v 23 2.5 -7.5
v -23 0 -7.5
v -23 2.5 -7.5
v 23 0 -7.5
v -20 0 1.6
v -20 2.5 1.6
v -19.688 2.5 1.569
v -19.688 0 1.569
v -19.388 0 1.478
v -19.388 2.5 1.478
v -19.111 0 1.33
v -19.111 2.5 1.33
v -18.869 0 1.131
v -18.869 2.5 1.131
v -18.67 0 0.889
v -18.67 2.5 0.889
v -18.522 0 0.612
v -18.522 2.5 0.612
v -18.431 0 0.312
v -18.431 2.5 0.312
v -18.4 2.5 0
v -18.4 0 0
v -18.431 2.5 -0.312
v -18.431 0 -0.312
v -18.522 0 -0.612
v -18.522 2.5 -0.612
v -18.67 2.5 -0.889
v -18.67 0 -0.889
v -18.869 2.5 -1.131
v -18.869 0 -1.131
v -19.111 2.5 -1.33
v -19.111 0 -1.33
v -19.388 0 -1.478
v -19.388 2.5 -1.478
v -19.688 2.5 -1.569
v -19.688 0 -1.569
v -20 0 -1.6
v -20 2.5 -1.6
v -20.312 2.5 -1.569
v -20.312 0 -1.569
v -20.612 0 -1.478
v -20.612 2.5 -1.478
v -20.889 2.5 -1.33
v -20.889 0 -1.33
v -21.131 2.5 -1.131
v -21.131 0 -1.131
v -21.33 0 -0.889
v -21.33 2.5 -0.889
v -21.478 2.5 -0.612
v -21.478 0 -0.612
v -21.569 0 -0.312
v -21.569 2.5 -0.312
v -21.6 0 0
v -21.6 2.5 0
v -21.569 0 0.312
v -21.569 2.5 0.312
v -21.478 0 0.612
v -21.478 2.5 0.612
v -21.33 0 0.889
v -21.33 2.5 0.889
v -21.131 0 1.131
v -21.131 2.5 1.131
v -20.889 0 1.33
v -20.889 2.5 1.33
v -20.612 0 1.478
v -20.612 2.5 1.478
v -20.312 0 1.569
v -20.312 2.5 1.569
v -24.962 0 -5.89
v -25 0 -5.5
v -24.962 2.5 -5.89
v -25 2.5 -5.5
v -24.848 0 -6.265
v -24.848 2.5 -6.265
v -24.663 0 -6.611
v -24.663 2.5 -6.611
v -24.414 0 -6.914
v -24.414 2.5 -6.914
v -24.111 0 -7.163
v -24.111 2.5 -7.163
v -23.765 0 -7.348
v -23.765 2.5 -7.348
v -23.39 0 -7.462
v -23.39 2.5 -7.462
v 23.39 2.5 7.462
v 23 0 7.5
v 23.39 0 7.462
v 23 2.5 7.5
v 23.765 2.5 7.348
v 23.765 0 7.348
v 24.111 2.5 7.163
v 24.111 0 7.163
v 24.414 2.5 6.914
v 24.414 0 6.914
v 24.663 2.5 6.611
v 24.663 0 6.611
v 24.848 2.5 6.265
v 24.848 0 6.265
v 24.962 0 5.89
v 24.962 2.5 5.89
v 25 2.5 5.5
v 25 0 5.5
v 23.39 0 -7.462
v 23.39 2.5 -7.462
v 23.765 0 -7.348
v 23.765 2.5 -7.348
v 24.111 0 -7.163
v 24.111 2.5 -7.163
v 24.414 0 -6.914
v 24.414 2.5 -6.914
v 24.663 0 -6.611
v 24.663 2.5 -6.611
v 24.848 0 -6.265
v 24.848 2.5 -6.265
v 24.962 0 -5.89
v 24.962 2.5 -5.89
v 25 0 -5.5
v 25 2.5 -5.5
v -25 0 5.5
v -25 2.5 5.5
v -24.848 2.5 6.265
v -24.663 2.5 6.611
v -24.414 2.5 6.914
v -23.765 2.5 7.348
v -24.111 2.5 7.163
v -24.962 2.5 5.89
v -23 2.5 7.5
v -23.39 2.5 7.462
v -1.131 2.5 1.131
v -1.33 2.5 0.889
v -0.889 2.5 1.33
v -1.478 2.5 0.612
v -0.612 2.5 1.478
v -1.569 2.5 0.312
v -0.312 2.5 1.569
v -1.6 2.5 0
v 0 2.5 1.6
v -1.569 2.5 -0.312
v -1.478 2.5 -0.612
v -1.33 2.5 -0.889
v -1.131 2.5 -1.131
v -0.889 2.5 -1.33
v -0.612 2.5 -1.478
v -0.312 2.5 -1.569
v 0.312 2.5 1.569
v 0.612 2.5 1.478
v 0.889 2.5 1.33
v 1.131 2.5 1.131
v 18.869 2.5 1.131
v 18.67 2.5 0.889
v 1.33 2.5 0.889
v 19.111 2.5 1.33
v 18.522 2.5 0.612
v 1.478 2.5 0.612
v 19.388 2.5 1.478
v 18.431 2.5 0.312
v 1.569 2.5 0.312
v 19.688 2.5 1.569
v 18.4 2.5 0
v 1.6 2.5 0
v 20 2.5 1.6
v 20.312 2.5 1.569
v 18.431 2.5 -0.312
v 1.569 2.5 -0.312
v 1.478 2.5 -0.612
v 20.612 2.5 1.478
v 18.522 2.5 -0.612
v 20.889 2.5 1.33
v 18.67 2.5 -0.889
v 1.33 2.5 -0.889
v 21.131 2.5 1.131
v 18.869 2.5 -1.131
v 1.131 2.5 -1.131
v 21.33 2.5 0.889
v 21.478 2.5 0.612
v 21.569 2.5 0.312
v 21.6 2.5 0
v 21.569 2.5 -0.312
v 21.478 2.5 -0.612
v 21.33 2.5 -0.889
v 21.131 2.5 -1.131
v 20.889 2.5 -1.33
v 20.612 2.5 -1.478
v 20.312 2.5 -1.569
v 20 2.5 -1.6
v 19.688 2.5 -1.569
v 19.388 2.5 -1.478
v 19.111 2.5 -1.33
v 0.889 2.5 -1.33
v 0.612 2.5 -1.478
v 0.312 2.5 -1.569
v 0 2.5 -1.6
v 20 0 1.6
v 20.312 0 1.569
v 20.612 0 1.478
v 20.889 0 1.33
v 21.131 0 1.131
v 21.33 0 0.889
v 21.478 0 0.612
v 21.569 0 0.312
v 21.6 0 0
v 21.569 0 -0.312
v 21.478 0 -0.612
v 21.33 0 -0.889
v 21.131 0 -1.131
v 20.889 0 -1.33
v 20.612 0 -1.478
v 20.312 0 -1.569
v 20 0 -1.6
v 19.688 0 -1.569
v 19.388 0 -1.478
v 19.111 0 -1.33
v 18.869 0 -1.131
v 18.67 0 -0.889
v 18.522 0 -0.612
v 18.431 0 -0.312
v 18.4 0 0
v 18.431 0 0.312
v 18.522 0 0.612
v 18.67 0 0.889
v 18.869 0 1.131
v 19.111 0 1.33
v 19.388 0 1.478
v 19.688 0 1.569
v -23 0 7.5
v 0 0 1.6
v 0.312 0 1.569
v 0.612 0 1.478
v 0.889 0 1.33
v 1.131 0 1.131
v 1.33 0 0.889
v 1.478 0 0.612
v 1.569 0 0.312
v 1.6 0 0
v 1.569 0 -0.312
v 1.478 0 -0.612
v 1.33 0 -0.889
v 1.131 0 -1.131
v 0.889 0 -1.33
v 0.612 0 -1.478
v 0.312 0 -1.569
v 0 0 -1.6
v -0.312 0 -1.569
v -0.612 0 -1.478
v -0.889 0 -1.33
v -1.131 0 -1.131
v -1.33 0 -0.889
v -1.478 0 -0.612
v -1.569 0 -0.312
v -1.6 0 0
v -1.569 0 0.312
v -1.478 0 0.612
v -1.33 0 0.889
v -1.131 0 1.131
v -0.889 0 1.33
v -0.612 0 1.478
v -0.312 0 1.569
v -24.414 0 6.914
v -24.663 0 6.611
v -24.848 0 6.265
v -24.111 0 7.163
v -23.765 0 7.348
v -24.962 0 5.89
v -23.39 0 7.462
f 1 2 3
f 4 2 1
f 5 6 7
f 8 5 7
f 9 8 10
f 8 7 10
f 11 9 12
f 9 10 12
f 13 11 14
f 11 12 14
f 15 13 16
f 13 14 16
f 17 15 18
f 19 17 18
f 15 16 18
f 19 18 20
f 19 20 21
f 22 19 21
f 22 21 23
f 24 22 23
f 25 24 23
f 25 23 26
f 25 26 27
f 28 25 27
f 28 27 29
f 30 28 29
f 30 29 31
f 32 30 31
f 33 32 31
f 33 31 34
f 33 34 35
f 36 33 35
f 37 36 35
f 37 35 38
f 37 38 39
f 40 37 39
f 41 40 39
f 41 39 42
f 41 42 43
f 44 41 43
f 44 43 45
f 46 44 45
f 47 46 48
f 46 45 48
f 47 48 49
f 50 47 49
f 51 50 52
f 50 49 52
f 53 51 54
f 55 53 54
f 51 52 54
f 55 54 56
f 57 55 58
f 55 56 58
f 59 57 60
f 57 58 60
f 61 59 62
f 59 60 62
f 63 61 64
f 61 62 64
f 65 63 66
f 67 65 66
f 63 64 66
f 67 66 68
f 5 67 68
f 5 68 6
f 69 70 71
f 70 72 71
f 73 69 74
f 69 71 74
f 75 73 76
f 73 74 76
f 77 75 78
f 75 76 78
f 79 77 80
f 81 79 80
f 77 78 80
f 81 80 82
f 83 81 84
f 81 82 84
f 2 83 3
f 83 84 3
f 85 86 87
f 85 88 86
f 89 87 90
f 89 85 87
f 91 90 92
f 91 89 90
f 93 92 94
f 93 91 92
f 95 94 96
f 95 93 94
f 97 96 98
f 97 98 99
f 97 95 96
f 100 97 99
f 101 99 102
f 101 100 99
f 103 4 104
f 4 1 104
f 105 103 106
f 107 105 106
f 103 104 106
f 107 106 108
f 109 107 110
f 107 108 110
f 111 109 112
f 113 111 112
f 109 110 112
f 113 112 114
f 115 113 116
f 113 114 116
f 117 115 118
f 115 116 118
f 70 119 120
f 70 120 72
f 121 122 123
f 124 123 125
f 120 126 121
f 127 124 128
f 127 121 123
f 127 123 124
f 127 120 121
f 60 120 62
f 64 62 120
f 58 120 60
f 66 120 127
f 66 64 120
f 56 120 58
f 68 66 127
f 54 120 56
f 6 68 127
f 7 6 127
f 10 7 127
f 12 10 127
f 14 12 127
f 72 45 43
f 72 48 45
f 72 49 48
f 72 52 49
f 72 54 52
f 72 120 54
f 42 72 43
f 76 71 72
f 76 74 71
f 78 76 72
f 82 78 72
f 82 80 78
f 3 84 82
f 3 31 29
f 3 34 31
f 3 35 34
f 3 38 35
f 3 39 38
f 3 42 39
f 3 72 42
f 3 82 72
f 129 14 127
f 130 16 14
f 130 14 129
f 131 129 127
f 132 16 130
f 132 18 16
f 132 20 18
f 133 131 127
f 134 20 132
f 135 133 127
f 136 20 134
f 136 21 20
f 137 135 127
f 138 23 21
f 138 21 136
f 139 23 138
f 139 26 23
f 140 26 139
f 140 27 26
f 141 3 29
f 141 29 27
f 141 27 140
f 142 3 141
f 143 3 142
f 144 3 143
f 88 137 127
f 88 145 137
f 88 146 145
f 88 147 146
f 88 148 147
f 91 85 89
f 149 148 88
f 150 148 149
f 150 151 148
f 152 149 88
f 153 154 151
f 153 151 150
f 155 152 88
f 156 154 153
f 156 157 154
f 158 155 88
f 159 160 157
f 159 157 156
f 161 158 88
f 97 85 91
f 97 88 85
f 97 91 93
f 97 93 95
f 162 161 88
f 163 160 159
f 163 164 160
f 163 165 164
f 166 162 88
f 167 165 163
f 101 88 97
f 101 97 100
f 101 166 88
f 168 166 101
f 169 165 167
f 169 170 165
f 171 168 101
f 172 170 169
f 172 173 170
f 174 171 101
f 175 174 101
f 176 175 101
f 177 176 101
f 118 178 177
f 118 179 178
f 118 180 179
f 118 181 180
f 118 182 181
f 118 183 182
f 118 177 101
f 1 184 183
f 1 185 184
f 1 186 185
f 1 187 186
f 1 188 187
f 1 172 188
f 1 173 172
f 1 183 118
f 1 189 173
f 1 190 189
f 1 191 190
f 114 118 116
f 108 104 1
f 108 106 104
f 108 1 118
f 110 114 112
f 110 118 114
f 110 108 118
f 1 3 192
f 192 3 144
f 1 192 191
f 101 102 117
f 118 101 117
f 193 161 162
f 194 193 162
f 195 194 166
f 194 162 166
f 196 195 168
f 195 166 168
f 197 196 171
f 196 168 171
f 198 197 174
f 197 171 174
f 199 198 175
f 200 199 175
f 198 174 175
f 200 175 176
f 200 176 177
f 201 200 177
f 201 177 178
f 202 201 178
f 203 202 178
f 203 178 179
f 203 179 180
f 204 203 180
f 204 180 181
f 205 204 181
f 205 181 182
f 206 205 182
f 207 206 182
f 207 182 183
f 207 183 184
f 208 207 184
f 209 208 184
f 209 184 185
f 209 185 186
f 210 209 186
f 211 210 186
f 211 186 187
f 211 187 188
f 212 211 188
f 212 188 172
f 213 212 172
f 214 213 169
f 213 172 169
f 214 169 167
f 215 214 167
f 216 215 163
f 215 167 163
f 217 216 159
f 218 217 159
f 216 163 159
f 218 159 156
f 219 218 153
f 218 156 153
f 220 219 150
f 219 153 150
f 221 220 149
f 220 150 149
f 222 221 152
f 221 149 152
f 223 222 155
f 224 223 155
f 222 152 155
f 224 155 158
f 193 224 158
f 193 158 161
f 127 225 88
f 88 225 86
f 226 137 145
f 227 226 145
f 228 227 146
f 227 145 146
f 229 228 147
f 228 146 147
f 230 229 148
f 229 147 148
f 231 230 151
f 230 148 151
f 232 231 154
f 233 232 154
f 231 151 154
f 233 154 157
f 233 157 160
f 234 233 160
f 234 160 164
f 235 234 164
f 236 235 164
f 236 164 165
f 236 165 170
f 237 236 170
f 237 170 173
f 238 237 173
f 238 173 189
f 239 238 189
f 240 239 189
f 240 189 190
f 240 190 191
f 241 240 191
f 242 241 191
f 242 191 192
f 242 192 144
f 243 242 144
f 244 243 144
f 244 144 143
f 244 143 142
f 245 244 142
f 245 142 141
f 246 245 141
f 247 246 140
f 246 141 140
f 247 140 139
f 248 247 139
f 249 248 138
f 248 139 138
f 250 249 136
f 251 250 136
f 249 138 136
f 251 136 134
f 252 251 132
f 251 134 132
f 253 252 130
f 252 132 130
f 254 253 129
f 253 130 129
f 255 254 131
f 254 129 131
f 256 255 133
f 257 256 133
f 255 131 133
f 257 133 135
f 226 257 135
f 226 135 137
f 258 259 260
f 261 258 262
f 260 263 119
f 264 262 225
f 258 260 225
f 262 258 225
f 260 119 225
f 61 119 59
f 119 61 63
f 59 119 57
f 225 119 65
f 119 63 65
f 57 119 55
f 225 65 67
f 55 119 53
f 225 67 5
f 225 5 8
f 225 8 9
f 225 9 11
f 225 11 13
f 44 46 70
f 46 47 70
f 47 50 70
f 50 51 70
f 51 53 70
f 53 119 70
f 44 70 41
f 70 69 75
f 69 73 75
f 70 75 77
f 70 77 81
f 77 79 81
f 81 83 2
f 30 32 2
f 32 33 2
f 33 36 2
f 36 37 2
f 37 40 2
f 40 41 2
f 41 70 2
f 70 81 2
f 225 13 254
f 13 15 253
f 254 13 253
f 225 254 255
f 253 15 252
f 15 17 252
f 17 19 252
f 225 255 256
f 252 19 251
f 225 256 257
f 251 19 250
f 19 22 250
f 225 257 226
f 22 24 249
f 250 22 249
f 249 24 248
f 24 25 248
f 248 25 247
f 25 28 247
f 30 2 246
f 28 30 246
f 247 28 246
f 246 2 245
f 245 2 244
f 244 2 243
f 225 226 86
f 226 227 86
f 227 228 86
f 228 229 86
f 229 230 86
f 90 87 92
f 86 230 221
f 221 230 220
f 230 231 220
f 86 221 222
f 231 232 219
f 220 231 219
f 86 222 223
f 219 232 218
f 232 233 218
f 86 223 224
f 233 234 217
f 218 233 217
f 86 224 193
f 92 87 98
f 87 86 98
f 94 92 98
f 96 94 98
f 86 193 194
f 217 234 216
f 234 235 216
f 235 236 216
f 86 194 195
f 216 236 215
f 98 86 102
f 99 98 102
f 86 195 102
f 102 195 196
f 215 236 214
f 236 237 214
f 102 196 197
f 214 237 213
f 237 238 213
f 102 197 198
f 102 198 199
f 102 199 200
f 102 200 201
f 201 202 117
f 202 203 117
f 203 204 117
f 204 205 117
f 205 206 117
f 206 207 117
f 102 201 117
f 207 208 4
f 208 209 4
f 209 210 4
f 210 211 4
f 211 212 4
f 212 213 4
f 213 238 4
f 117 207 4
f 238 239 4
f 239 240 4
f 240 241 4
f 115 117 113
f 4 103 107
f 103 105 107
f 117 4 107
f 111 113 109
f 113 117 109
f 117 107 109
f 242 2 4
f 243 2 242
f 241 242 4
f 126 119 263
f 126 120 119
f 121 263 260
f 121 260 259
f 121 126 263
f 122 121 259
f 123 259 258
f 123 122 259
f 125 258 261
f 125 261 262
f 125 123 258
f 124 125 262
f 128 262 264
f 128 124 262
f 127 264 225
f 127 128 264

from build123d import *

# Parameters (mm, degrees)
SKETCH_1_W          = 50
SKETCH_1_H          = 15
EXTRUDE_1_DEPTH     = 2.5
SKETCH_2_R          = 1.6
CUT_EXTRUDE_1_DEPTH = 27.220221204
FILLET_1_R          = 2


with BuildPart() as part:
    # 草图1 → 凸台-拉伸1 (new body)
    with BuildSketch(Plane(origin=(0, 0, 0), x_dir=(1, 0, 0), z_dir=(0, 1, 0))):
        Rectangle(SKETCH_1_W, SKETCH_1_H)
    extrude(amount=EXTRUDE_1_DEPTH)

    # 草图2 → 切除-拉伸1 (cut, through all)
    with BuildSketch(Plane(origin=(0, 2.5, 0), x_dir=(1, 0, 0), z_dir=(0, 1, 0))):
        with Locations(Location((0, 0, 0), (0, 0, 270))):
            Circle(SKETCH_2_R)
        with Locations(Location((-20, 0, 0), (0, 0, 270))):
            Circle(SKETCH_2_R)
        with Locations(Location((20, 0, 0), (0, 0, 270))):
            Circle(SKETCH_2_R)
    extrude(amount=-CUT_EXTRUDE_1_DEPTH, mode=Mode.SUBTRACT)

    # 圆角1
    fillet_1_edges = [part.edges().sort_by_distance(p)[0] for p in [
        (25, 1.25, 7.5),
        (-25, 1.25, 7.5),
        (-25, 1.25, -7.5),
        (25, 1.25, -7.5),
    ]]
    fillet(fillet_1_edges, radius=FILLET_1_R)


solid = part.part
